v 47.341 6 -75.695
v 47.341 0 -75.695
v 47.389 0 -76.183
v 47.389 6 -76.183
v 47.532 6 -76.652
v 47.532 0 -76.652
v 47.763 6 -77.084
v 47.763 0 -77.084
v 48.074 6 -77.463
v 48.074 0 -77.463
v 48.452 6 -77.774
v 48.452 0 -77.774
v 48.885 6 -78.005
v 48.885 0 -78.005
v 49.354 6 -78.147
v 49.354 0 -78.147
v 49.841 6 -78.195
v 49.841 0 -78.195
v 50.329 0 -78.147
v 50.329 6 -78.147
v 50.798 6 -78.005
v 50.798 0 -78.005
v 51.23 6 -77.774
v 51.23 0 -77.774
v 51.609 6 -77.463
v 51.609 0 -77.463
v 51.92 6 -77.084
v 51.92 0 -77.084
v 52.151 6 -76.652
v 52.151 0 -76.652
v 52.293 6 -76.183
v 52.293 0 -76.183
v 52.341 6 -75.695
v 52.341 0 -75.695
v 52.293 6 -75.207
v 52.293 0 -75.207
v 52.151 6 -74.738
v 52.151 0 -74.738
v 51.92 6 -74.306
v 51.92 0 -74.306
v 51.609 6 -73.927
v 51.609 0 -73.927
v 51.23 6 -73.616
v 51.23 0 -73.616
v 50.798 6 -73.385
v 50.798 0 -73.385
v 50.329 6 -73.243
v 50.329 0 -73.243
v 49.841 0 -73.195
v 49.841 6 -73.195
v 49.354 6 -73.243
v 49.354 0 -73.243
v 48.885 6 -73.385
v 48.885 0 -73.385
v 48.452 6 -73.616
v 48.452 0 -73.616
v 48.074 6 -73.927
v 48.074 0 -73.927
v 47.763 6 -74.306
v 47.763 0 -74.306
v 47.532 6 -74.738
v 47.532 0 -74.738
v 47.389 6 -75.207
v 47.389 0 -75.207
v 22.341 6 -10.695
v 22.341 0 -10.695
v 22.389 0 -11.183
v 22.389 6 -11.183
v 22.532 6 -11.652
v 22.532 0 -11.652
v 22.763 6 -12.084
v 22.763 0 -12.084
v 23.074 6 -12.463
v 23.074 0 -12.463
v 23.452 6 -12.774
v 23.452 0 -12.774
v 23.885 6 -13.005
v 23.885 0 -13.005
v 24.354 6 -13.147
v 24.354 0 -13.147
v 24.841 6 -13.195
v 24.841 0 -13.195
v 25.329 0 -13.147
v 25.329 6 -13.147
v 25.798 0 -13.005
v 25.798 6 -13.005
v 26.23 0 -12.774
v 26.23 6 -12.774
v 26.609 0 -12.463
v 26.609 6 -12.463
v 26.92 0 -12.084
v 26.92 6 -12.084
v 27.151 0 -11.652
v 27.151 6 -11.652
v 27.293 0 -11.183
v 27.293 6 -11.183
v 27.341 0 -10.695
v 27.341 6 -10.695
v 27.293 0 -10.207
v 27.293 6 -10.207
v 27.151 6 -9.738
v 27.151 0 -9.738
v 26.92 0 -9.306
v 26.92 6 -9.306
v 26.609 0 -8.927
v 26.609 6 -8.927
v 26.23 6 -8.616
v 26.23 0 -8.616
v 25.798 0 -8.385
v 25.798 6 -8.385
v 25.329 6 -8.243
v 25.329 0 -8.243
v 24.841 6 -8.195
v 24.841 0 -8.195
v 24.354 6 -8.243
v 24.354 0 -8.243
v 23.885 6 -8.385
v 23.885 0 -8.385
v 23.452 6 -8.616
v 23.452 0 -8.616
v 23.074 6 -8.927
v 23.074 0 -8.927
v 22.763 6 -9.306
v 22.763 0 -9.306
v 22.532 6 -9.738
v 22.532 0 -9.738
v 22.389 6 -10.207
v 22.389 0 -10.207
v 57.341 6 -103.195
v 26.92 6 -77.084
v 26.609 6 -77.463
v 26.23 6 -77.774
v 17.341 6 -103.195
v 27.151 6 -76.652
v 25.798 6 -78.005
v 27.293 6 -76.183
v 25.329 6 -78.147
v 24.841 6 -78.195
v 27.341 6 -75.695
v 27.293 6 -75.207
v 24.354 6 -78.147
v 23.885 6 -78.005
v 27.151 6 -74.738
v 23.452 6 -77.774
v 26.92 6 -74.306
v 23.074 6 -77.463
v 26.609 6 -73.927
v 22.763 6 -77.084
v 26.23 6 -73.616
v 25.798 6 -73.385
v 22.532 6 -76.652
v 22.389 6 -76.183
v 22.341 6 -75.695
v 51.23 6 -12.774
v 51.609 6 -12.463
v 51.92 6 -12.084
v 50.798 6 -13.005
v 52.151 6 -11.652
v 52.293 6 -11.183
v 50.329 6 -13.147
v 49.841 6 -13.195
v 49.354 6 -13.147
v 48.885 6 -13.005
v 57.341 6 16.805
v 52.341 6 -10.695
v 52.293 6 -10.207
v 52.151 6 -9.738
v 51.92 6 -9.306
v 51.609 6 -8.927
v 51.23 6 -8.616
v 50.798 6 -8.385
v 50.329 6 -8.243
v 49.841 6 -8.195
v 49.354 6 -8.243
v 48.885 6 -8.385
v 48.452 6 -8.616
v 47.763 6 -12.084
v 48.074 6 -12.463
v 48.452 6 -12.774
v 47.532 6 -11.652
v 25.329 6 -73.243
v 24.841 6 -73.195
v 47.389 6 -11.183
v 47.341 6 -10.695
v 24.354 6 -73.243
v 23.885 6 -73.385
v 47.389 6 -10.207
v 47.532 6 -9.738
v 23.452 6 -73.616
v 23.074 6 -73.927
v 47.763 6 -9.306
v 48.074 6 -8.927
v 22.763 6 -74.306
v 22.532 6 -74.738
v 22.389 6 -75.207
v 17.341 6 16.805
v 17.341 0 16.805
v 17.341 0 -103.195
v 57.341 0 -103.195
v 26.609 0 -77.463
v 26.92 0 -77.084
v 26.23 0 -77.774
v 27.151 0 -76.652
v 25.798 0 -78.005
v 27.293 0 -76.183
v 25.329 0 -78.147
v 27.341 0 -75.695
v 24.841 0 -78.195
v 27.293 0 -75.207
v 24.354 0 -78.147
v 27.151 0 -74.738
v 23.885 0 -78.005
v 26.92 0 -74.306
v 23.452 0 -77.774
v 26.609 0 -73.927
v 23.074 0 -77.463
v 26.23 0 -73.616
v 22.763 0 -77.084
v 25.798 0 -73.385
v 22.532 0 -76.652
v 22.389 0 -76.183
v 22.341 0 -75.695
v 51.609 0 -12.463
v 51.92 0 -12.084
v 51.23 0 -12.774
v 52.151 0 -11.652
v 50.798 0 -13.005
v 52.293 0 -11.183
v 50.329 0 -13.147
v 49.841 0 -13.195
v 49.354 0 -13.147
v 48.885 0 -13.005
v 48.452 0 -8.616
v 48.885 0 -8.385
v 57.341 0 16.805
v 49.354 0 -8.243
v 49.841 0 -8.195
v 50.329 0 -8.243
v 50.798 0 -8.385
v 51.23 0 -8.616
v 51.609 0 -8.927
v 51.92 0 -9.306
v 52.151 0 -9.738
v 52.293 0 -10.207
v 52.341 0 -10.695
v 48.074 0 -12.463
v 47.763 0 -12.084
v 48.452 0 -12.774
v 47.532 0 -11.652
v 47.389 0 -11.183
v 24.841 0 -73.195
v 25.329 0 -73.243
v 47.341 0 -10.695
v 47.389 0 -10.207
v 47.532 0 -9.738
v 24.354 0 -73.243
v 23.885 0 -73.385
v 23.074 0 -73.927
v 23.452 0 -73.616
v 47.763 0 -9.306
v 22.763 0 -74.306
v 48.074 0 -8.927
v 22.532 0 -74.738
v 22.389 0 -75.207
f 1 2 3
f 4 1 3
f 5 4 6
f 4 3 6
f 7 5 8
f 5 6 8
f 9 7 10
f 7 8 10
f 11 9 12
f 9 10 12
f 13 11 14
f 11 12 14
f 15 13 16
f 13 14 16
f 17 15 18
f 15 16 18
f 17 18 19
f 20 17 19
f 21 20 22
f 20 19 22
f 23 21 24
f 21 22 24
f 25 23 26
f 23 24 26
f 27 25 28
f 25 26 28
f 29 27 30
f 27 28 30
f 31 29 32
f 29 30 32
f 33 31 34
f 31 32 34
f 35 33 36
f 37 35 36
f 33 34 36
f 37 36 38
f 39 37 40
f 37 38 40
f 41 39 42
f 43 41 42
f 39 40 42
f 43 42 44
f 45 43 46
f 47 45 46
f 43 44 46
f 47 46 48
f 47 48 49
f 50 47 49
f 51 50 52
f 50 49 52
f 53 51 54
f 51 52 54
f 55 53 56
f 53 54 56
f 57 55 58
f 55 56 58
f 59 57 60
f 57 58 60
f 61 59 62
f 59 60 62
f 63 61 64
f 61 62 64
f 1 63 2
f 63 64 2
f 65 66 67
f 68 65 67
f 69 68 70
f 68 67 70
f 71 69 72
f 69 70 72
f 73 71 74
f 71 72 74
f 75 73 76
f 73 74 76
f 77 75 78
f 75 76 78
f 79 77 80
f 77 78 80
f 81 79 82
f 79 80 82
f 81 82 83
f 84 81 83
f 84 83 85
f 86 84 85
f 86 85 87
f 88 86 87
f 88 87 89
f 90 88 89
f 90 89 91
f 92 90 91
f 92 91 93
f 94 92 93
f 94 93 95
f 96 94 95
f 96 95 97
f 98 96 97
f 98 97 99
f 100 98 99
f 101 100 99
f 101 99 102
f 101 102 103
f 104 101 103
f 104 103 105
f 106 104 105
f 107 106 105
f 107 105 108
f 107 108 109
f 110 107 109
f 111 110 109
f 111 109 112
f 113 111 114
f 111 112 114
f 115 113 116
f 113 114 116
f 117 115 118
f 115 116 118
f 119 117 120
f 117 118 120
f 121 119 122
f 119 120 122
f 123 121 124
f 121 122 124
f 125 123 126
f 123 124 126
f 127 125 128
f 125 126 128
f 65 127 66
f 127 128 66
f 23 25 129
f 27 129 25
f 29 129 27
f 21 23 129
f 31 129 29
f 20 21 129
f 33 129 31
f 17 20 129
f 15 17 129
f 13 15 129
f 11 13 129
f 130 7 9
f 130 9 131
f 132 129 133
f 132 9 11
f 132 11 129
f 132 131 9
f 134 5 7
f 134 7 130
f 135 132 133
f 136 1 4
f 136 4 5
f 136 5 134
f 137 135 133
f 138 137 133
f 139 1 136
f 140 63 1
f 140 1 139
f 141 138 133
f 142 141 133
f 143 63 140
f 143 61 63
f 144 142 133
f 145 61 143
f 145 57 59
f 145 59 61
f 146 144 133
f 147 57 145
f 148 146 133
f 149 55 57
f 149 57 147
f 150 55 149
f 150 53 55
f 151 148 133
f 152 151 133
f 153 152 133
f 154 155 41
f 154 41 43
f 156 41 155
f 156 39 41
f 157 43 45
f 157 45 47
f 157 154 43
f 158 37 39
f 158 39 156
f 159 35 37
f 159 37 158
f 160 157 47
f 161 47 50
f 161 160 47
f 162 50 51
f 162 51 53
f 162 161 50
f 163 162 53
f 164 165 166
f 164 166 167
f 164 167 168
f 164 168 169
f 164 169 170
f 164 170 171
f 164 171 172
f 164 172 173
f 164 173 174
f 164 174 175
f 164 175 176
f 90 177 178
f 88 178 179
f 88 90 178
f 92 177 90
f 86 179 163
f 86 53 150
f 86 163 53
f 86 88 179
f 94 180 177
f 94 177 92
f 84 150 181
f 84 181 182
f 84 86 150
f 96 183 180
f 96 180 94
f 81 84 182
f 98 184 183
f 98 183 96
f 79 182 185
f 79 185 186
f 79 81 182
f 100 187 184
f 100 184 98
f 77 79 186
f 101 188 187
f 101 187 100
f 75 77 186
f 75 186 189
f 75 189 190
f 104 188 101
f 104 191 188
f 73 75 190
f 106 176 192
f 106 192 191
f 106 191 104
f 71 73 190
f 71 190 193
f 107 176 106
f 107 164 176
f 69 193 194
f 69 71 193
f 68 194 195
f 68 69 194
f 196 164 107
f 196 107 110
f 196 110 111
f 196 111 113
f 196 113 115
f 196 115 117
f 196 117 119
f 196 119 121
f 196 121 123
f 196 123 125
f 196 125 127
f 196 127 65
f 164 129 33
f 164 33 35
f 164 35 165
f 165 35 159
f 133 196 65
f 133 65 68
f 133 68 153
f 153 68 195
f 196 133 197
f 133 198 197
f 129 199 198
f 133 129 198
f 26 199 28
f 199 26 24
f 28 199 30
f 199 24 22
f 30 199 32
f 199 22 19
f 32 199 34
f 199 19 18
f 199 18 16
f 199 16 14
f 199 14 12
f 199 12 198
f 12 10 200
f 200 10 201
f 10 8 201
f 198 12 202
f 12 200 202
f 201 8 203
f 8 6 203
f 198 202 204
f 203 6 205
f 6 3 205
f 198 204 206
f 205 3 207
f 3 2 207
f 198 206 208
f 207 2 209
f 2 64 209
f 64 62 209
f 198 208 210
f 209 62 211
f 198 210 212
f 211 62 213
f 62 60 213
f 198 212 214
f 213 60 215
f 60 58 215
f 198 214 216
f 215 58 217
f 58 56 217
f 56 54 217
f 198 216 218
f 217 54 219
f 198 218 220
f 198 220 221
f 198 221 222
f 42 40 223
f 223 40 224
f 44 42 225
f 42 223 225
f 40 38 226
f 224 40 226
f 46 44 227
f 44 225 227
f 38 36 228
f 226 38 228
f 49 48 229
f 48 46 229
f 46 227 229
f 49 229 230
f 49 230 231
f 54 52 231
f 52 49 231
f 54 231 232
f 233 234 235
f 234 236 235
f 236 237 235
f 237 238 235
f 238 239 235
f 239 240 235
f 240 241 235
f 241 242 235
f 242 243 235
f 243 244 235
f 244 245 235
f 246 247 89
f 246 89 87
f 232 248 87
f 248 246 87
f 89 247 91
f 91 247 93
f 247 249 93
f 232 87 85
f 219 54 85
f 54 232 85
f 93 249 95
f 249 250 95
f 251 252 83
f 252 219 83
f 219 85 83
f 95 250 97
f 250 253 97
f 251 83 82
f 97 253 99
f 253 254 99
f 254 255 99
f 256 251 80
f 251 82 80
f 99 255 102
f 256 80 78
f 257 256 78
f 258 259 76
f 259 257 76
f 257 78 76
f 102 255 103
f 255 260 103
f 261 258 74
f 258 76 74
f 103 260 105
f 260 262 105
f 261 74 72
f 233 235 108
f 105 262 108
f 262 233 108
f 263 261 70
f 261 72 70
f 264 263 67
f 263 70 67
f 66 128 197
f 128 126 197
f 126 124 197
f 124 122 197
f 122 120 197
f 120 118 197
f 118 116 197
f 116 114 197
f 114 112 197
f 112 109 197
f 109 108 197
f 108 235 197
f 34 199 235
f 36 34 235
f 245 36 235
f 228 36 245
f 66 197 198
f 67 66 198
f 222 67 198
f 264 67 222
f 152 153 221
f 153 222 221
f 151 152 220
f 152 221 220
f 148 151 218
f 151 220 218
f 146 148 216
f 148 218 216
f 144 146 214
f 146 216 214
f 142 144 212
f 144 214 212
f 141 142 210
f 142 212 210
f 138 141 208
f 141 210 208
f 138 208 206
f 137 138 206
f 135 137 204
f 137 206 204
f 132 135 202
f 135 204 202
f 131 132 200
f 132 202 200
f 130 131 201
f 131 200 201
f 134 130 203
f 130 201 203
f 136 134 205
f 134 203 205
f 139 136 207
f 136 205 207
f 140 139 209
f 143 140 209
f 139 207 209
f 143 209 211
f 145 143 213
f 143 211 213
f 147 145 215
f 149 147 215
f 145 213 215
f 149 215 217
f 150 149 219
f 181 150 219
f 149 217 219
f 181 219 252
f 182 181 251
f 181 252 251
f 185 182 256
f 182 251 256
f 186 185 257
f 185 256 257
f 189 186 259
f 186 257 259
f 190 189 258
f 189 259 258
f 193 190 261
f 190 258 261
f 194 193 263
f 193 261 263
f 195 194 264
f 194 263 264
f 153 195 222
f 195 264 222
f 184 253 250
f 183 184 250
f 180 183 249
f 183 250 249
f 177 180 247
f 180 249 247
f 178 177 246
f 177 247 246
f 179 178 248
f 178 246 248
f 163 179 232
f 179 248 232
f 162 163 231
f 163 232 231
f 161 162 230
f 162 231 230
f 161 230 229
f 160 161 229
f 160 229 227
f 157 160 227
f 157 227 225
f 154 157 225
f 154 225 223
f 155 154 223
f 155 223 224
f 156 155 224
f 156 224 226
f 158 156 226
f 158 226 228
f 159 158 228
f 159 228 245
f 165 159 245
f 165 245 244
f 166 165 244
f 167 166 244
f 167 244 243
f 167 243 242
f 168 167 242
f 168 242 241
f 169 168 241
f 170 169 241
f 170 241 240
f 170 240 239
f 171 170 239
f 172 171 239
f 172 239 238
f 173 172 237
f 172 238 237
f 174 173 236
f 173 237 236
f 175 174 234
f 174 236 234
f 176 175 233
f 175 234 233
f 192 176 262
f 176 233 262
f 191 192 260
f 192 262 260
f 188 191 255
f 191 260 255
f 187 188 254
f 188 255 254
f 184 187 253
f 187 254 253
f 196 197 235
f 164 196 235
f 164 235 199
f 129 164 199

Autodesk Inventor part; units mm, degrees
ref_plane "YZ Plane" through (0, 0, 0) normal (1, 0, 0) x (0, 1, 0)
ref_plane "XZ Plane" through (0, 0, 0) normal (0, 1, 0) x (-1, 0, 0)
ref_plane "XY Plane" through (0, 0, 0) normal (0, 0, 1) x (1, 0, 0)
sketch "Sketch1" plane through (0, 0, 0) normal (0, 1, 0) x (-1, 0, 0)
  line L0 (-17.3414, 16.8049) -> (-57.3414, 16.8049)
  line L1 (-57.3414, 16.8049) -> (-57.3414, -103.1951)
  line L2 (-57.3414, -103.1951) -> (-17.3414, -103.1951)
  line L3 (-17.3414, -103.1951) -> (-17.3414, 16.8049)
  line L4 (-24.8414, -10.6951) -> (-49.8414, -10.6951)
  line L5 (-49.8414, -10.6951) -> (-49.8414, -75.6951)
  line L6 (-49.8414, -75.6951) -> (-24.8414, -75.6951)
  line L7 (-24.8414, -75.6951) -> (-24.8414, -10.6951)
  circle A0 centre (-24.8414, -10.6951) radius 2.5
  circle A1 centre (-24.8414, -75.6951) radius 2.5
  circle A2 centre (-49.8414, -75.6951) radius 2.5
  circle A3 centre (-49.8414, -10.6951) radius 2.5
  point P0 (0, 0)
  dimension "d0" = 40
  dimension "d1" = 120
  dimension "d4" = 25
  dimension "d5" = 65
  dimension "d6" = 27.5
  dimension "d7" = 7.5
  dimension "d8" = 5
  dimension "d9" = 5
  dimension "d10" = 5
  dimension "d11" = 5
extrude "Extrusion1" add sketch "Sketch1" along normal blind 6 contours L3 L2 L1 L0 | L4 A0 L7 A1 L6 A2 L5 A3
properties part number "steeringmountplate"
